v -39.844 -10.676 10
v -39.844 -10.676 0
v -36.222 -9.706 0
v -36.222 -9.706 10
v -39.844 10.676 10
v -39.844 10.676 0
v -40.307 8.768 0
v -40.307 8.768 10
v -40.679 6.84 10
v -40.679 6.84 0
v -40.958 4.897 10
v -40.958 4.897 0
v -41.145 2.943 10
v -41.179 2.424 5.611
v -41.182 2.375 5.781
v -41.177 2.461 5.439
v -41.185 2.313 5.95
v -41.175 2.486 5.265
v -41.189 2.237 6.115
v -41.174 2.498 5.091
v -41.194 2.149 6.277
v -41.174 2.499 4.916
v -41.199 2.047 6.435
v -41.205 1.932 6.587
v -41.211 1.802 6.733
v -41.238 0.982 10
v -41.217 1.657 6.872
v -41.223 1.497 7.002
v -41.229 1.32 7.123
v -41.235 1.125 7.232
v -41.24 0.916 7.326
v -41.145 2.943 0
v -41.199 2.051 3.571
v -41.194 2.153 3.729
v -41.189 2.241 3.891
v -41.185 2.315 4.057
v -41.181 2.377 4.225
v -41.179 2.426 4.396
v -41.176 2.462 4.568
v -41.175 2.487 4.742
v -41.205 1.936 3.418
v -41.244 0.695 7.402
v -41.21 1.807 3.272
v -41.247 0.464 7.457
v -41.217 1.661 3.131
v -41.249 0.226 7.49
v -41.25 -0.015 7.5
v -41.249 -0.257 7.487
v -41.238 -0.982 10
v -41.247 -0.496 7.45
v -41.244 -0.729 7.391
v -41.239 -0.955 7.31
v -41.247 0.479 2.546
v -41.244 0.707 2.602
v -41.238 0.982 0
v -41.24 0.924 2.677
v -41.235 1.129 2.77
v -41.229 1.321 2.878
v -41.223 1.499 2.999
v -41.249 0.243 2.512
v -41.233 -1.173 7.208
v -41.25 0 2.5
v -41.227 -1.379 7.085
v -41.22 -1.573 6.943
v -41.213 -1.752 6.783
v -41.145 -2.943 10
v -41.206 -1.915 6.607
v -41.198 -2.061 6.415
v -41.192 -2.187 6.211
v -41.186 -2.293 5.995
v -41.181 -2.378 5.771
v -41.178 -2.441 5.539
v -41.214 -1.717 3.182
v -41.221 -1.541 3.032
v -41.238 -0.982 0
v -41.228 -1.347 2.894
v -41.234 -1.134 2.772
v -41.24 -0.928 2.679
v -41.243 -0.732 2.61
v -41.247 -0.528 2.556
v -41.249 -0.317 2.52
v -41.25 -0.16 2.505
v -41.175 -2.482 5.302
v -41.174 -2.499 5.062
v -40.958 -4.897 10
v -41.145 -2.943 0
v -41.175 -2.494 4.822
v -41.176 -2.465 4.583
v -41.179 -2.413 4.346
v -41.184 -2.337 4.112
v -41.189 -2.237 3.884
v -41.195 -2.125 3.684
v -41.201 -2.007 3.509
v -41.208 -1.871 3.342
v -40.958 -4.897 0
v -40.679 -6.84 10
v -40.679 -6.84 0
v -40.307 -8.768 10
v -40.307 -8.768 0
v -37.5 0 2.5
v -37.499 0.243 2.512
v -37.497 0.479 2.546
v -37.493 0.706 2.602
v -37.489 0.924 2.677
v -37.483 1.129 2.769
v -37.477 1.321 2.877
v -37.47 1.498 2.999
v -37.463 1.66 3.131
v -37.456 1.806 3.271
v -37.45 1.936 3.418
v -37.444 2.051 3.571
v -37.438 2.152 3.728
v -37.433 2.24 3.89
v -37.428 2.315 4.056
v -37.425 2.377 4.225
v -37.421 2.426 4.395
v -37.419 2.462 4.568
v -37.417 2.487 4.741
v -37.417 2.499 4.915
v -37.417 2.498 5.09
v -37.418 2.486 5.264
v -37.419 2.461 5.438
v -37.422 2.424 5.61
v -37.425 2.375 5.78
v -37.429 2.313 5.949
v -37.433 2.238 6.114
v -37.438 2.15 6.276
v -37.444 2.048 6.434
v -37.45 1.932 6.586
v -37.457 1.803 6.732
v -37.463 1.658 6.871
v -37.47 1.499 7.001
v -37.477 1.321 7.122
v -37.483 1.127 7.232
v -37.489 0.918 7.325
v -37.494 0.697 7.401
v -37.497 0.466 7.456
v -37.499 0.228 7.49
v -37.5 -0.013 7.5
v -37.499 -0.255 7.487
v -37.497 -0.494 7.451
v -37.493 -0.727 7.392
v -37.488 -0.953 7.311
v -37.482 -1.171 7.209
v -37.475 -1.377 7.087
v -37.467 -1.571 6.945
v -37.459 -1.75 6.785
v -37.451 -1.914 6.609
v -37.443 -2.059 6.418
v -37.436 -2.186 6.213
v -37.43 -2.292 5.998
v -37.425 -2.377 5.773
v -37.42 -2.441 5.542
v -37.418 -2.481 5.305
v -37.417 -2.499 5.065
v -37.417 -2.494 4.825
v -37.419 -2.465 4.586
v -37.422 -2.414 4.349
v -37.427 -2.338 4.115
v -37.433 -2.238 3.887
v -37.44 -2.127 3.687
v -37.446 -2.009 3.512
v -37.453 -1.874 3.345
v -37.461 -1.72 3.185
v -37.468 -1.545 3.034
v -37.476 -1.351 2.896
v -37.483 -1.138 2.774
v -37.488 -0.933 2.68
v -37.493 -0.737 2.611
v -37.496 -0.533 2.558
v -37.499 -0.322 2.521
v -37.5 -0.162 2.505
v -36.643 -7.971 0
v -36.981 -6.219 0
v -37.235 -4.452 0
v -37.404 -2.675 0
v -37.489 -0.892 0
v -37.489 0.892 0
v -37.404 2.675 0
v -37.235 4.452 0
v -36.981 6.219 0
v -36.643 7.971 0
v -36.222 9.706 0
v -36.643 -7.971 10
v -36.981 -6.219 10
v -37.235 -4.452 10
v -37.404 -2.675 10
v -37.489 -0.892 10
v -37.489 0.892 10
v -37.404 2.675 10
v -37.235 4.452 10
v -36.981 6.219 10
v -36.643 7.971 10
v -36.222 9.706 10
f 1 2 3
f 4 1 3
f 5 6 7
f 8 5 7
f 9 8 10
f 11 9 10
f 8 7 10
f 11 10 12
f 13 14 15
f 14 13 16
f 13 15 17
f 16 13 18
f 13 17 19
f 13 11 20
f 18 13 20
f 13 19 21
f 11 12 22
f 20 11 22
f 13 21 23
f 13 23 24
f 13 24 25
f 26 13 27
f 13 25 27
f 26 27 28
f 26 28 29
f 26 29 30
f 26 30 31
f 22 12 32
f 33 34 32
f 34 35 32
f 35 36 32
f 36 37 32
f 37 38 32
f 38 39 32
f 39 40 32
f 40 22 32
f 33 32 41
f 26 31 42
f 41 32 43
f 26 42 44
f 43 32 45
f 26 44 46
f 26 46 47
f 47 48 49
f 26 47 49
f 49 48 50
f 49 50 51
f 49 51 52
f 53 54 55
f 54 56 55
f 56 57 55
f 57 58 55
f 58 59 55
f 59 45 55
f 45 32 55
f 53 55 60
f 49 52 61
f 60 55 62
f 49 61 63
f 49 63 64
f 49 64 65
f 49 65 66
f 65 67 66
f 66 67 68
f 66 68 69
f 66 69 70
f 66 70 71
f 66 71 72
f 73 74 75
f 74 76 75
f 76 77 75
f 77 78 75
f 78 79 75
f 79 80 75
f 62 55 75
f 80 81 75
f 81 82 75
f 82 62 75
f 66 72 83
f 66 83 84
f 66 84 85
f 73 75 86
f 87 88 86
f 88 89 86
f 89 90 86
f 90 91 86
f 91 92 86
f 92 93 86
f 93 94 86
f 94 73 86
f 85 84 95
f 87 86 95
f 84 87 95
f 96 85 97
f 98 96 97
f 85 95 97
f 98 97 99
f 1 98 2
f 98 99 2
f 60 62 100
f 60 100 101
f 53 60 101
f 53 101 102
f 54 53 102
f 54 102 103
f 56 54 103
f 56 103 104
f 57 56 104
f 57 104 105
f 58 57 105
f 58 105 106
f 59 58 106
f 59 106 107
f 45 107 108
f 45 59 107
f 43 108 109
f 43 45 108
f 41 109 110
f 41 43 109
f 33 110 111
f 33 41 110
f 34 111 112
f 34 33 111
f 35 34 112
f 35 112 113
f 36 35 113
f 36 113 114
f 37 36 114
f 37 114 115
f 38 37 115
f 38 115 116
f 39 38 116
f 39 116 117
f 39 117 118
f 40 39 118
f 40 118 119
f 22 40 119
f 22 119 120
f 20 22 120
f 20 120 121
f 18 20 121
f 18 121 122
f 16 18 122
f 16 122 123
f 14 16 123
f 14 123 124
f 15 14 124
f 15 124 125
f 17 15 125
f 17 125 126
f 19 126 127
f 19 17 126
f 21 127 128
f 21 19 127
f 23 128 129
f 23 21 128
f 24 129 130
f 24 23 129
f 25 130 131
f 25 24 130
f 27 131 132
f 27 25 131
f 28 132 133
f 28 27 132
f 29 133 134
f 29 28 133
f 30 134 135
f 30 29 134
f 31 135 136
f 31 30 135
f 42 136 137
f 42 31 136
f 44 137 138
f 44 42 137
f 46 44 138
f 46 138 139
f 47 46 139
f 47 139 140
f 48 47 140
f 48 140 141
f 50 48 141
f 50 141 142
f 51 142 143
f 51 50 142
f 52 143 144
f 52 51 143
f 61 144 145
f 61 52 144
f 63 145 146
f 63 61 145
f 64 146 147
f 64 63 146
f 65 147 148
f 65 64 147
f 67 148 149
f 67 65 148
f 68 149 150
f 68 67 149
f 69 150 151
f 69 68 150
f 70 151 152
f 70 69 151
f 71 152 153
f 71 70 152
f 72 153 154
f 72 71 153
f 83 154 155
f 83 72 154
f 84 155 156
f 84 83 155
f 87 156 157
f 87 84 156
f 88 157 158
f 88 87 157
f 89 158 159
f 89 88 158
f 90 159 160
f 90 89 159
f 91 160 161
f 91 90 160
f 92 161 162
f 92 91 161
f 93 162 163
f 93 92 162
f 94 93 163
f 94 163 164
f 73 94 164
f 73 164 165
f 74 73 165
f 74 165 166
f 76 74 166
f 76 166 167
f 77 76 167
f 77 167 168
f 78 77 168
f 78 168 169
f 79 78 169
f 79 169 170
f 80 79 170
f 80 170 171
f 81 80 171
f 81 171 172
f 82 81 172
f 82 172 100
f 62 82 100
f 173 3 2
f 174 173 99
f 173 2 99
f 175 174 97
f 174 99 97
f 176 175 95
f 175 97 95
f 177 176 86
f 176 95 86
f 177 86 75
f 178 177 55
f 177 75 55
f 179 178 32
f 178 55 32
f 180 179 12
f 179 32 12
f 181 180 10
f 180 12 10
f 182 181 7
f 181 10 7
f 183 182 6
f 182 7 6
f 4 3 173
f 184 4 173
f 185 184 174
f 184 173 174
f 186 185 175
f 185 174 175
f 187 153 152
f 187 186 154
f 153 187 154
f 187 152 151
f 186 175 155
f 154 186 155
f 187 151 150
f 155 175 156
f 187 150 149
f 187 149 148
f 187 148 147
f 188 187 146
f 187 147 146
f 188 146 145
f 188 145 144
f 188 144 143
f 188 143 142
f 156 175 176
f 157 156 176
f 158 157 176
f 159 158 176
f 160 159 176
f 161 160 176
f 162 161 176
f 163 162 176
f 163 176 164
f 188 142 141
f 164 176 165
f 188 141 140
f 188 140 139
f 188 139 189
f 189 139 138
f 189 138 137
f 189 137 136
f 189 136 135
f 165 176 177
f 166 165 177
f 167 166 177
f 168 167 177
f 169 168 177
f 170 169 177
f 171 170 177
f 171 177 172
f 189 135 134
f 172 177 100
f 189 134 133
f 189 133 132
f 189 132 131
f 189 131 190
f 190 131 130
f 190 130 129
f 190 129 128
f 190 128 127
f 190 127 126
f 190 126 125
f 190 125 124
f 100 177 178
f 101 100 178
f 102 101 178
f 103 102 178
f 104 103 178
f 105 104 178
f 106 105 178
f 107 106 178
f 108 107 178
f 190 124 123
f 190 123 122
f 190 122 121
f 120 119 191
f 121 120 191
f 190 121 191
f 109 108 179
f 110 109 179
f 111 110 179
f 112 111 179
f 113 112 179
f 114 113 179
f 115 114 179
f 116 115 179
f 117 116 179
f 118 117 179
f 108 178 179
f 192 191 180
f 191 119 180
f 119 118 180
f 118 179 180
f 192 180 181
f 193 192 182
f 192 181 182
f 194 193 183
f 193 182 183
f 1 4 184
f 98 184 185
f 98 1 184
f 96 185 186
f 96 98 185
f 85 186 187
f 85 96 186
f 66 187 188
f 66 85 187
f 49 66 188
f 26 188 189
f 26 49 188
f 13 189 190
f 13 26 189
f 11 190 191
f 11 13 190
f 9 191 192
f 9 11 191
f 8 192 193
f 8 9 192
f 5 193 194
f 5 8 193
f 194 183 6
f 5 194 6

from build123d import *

# Parameters (mm, degrees)
BOSS_EXTRUDE1_DEPTH     = 10
CUT_EXTRUDE1_DEPTH      = 44.76694614
CUT_EXTRUDE1_DEPTH_BACK = 44.76694614
SKETCH2_R               = 2.5


with BuildPart() as part:
    # Sketch1 → Boss-Extrude1 (new body)
    with BuildSketch(Plane(origin=(0, 0, 0), x_dir=(0, 1, 0), z_dir=(0, 0, 1))):
        with BuildLine():
            Line((-10.67628561, 39.844440334), (-9.705714191, 36.222218486))
            ThreePointArc((-9.705714191, 36.222218486), (0, 37.5), (9.705714191, 36.222218486))
            Line((9.705714191, 36.222218486), (10.67628561, 39.844440334))
            ThreePointArc((10.67628561, 39.844440334), (0, 41.25), (-10.67628561, 39.844440334))
        make_face()
    extrude(amount=BOSS_EXTRUDE1_DEPTH)

    # Sketch2 → Cut-Extrude1 (cut, two sides: drawn at the far end of the back side and taken through both)
    with BuildSketch(Plane.YZ.offset(-CUT_EXTRUDE1_DEPTH_BACK)):
        with Locations(Location((0, 5, 0), (0, 0, 270))):
            Circle(SKETCH2_R)
    extrude(amount=CUT_EXTRUDE1_DEPTH + CUT_EXTRUDE1_DEPTH_BACK, mode=Mode.SUBTRACT)


solid = part.part
